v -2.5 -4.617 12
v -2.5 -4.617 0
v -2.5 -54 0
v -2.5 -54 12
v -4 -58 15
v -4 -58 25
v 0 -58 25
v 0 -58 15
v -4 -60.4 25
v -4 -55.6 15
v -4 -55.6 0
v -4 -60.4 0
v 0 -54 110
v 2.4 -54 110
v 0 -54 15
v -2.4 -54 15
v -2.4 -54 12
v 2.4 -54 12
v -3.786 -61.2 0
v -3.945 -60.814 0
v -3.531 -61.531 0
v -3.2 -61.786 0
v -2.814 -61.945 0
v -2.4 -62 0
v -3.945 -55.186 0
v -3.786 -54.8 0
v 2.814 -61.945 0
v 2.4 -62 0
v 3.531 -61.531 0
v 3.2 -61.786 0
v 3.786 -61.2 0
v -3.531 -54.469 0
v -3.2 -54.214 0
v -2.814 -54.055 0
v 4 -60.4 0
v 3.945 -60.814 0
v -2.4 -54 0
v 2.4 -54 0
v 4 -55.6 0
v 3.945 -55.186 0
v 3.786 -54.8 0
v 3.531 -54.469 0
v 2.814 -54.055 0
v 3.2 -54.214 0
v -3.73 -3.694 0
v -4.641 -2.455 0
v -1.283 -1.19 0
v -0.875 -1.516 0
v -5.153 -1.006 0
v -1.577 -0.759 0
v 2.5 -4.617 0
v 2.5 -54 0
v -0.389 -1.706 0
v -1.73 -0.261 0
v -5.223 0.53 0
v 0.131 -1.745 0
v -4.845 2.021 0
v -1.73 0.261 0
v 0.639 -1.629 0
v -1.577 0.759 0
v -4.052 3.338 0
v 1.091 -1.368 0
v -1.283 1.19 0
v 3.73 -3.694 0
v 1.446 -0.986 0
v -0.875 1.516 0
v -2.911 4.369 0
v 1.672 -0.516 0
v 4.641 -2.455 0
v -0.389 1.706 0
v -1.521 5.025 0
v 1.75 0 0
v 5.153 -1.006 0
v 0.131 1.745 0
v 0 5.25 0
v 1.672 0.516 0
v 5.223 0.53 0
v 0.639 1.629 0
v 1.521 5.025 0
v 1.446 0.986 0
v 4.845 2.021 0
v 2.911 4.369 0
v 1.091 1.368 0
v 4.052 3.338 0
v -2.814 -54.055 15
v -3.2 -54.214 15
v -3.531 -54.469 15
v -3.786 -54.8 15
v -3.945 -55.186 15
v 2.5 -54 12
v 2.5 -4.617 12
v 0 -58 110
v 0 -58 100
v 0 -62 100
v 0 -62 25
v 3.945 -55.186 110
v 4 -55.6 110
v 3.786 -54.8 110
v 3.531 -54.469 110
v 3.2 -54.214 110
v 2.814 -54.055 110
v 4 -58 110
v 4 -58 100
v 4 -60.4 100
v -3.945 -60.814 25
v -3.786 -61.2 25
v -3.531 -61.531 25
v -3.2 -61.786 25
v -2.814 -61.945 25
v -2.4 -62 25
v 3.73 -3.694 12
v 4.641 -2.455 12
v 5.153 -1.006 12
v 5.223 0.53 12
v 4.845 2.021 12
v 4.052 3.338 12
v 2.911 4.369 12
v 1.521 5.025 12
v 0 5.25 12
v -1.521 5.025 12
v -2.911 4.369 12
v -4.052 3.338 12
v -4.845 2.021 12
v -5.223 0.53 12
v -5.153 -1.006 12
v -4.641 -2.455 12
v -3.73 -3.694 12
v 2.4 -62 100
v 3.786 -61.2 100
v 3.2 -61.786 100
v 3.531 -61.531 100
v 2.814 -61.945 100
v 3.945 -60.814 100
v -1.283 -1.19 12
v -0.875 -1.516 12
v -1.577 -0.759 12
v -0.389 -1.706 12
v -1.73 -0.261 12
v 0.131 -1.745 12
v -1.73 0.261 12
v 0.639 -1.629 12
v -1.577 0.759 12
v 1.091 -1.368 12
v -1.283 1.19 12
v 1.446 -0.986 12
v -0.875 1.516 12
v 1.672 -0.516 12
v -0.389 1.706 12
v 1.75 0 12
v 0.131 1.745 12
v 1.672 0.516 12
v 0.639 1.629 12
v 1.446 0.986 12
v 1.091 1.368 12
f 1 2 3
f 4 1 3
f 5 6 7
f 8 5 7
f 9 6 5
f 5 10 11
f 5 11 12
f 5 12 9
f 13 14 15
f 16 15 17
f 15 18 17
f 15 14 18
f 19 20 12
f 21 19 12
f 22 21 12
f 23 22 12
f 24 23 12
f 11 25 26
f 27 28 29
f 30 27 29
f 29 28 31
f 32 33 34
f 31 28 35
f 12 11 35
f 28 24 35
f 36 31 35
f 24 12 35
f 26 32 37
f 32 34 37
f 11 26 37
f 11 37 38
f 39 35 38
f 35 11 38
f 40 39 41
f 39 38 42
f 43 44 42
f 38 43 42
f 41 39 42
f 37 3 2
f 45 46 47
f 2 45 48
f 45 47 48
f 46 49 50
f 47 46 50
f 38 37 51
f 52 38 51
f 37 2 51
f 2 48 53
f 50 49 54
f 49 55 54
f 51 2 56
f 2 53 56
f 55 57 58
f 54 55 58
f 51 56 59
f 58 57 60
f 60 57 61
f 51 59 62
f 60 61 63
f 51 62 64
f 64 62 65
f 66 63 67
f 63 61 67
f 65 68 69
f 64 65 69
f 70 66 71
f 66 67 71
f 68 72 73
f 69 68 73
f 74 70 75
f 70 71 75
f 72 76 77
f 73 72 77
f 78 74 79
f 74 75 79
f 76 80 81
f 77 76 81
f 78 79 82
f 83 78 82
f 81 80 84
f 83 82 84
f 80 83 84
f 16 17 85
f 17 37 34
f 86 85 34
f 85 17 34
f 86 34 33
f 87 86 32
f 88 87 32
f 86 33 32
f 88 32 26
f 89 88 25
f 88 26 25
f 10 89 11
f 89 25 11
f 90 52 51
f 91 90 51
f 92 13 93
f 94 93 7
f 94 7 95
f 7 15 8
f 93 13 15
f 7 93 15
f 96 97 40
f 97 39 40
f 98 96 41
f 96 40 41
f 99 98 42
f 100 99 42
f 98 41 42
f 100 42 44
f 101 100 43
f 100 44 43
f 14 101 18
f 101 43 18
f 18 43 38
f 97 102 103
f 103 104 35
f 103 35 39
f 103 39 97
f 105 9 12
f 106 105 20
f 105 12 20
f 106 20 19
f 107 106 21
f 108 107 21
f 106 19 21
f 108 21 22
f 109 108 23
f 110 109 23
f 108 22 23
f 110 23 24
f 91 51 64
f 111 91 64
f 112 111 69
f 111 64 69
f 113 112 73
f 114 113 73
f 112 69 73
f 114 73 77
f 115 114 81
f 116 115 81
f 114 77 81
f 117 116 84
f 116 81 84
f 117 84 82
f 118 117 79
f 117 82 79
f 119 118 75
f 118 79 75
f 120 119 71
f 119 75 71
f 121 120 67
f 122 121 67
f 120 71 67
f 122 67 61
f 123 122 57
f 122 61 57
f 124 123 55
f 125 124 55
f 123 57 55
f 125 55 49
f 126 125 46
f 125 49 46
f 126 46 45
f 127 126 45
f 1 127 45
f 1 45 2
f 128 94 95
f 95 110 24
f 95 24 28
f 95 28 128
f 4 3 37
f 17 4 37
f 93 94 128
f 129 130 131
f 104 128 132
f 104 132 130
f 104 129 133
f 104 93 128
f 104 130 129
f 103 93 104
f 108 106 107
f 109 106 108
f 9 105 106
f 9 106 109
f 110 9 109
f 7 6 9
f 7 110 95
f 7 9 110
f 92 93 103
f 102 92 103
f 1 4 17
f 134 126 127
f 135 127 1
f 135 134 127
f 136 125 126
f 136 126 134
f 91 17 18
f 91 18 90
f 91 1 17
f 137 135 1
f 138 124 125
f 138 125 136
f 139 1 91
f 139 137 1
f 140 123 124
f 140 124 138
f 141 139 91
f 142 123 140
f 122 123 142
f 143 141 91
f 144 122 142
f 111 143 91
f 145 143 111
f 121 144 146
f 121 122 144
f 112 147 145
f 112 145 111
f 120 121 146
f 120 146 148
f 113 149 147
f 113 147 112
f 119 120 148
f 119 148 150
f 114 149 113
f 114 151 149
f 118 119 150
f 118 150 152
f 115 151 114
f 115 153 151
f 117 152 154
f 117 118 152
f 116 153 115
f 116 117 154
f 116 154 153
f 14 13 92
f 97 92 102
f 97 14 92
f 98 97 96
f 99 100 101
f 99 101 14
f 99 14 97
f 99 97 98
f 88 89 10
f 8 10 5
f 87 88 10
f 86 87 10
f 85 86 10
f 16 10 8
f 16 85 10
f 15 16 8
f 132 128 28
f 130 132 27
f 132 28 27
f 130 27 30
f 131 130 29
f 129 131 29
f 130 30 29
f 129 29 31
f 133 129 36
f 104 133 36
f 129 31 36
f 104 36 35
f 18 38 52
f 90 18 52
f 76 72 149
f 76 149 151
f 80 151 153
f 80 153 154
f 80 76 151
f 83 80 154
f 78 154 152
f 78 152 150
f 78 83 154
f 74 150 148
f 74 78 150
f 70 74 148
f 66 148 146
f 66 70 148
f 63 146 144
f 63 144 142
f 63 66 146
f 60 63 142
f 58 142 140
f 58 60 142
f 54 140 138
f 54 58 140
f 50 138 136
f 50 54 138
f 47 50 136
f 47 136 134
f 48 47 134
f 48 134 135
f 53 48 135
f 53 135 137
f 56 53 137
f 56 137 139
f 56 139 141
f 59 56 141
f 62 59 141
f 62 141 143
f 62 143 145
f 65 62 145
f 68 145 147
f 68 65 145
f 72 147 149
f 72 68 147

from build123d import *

# Parameters (mm, degrees)
F0_R     = 1.75
F1_DEPTH = 12
F2_DEPTH = 25
F4_DEPTH = 75
F6_DEPTH = 10
F8_DEPTH = 10


# Not quite as in the source:
# - a feature names something its author has since deleted; it is built from what else it names


with BuildPart() as f1:
    # F0 (on Top) → F1 (new body)
    with BuildSketch(Plane.XY):
        with BuildLine():
            ThreePointArc((2.5, -4.6165463282), (0, -5.25), (-2.5, -4.6165463282))
            Line((-2.5, -4.6165463282), (-2.5, -54))
            Line((-2.5, -54), (-2.4, -54))
            Line((-2.4, -54), (2.4, -54))
            Line((2.4, -54), (2.5, -54))
            Line((2.5, -54), (2.5, -4.6165463282))
        make_face()
        with BuildLine():
            Line((-2.5, -4), (-2.5, -4.6165463282))
            ThreePointArc((-2.5, -4.6165463282), (0, -5.25), (2.5, -4.6165463282))
            Line((2.5, -4.6165463282), (2.5, -4))
            Line((2.5, -4), (-2.5, -4))
        make_face()
        with BuildLine():
            ThreePointArc((2.5, -4.6165463282), (4.5104046382, -2.6867731575), (5.25, 0))
            ThreePointArc((5.25, 0), (-2.6867731575, 4.5104046382), (-2.5, -4.6165463282))
            Line((-2.5, -4.6165463282), (-2.5, -4))
            Line((-2.5, -4), (2.5, -4))
            Line((2.5, -4), (2.5, -4.6165463282))
        make_face()
        Circle(F0_R, mode=Mode.SUBTRACT)
    extrude(amount=F1_DEPTH)

    # F0 (on Top) → F2 (join)
    with BuildSketch(Plane.XY):
        with BuildLine():
            Line((2.4, -54), (-2.4, -54))
            ThreePointArc((-2.4, -54), (-3.5313708499, -54.4686291501), (-4, -55.6))
            Line((-4, -55.6), (-4, -60.4))
            ThreePointArc((-4, -60.4), (-3.5313708499, -61.5313708499), (-2.4, -62))
            Line((-2.4, -62), (2.4, -62))
            ThreePointArc((2.4, -62), (3.5313708499, -61.5313708499), (4, -60.4))
            Line((4, -60.4), (4, -55.6))
            ThreePointArc((4, -55.6), (3.5313708499, -54.4686291501), (2.4, -54))
        make_face()
    extrude(amount=F2_DEPTH)

    # F3 (on face) → F4 (join)
    with BuildSketch(Plane.XY.offset(25)):
        with BuildLine():
            Line((2.4, -54), (0, -54))
            Line((0, -54), (0, -62))
            Line((0, -62), (2.4, -62))
            ThreePointArc((2.4, -62), (3.5313708499, -61.5313708499), (4, -60.4))
            Line((4, -60.4), (4, -55.6))
            ThreePointArc((4, -55.6), (3.5313708499, -54.4686291501), (2.4, -54))
        make_face()
    extrude(amount=F4_DEPTH)

    # F5 (on face) → F6 (cut)
    with BuildSketch(Plane.XY.offset(25)):
        with BuildLine():
            Line((-4, -58), (0, -58))
            Line((0, -58), (0, -54))
            Line((0, -54), (-2.4, -54))
            ThreePointArc((-2.4, -54), (-3.5313708499, -54.4686291501), (-4, -55.6))
            Line((-4, -55.6), (-4, -58))
        make_face()
    extrude(amount=-F6_DEPTH, mode=Mode.SUBTRACT)

    # F7 (on face) → F8 (join)
    with BuildSketch(Plane.XY.offset(100)):
        with BuildLine():
            Line((0, -58), (4, -58))
            Line((4, -58), (4, -55.6))
            ThreePointArc((4, -55.6), (3.5313708499, -54.4686291501), (2.4, -54))
            Line((2.4, -54), (0, -54))
            Line((0, -54), (0, -58))
        make_face()
    extrude(amount=F8_DEPTH)


solid = f1.part
